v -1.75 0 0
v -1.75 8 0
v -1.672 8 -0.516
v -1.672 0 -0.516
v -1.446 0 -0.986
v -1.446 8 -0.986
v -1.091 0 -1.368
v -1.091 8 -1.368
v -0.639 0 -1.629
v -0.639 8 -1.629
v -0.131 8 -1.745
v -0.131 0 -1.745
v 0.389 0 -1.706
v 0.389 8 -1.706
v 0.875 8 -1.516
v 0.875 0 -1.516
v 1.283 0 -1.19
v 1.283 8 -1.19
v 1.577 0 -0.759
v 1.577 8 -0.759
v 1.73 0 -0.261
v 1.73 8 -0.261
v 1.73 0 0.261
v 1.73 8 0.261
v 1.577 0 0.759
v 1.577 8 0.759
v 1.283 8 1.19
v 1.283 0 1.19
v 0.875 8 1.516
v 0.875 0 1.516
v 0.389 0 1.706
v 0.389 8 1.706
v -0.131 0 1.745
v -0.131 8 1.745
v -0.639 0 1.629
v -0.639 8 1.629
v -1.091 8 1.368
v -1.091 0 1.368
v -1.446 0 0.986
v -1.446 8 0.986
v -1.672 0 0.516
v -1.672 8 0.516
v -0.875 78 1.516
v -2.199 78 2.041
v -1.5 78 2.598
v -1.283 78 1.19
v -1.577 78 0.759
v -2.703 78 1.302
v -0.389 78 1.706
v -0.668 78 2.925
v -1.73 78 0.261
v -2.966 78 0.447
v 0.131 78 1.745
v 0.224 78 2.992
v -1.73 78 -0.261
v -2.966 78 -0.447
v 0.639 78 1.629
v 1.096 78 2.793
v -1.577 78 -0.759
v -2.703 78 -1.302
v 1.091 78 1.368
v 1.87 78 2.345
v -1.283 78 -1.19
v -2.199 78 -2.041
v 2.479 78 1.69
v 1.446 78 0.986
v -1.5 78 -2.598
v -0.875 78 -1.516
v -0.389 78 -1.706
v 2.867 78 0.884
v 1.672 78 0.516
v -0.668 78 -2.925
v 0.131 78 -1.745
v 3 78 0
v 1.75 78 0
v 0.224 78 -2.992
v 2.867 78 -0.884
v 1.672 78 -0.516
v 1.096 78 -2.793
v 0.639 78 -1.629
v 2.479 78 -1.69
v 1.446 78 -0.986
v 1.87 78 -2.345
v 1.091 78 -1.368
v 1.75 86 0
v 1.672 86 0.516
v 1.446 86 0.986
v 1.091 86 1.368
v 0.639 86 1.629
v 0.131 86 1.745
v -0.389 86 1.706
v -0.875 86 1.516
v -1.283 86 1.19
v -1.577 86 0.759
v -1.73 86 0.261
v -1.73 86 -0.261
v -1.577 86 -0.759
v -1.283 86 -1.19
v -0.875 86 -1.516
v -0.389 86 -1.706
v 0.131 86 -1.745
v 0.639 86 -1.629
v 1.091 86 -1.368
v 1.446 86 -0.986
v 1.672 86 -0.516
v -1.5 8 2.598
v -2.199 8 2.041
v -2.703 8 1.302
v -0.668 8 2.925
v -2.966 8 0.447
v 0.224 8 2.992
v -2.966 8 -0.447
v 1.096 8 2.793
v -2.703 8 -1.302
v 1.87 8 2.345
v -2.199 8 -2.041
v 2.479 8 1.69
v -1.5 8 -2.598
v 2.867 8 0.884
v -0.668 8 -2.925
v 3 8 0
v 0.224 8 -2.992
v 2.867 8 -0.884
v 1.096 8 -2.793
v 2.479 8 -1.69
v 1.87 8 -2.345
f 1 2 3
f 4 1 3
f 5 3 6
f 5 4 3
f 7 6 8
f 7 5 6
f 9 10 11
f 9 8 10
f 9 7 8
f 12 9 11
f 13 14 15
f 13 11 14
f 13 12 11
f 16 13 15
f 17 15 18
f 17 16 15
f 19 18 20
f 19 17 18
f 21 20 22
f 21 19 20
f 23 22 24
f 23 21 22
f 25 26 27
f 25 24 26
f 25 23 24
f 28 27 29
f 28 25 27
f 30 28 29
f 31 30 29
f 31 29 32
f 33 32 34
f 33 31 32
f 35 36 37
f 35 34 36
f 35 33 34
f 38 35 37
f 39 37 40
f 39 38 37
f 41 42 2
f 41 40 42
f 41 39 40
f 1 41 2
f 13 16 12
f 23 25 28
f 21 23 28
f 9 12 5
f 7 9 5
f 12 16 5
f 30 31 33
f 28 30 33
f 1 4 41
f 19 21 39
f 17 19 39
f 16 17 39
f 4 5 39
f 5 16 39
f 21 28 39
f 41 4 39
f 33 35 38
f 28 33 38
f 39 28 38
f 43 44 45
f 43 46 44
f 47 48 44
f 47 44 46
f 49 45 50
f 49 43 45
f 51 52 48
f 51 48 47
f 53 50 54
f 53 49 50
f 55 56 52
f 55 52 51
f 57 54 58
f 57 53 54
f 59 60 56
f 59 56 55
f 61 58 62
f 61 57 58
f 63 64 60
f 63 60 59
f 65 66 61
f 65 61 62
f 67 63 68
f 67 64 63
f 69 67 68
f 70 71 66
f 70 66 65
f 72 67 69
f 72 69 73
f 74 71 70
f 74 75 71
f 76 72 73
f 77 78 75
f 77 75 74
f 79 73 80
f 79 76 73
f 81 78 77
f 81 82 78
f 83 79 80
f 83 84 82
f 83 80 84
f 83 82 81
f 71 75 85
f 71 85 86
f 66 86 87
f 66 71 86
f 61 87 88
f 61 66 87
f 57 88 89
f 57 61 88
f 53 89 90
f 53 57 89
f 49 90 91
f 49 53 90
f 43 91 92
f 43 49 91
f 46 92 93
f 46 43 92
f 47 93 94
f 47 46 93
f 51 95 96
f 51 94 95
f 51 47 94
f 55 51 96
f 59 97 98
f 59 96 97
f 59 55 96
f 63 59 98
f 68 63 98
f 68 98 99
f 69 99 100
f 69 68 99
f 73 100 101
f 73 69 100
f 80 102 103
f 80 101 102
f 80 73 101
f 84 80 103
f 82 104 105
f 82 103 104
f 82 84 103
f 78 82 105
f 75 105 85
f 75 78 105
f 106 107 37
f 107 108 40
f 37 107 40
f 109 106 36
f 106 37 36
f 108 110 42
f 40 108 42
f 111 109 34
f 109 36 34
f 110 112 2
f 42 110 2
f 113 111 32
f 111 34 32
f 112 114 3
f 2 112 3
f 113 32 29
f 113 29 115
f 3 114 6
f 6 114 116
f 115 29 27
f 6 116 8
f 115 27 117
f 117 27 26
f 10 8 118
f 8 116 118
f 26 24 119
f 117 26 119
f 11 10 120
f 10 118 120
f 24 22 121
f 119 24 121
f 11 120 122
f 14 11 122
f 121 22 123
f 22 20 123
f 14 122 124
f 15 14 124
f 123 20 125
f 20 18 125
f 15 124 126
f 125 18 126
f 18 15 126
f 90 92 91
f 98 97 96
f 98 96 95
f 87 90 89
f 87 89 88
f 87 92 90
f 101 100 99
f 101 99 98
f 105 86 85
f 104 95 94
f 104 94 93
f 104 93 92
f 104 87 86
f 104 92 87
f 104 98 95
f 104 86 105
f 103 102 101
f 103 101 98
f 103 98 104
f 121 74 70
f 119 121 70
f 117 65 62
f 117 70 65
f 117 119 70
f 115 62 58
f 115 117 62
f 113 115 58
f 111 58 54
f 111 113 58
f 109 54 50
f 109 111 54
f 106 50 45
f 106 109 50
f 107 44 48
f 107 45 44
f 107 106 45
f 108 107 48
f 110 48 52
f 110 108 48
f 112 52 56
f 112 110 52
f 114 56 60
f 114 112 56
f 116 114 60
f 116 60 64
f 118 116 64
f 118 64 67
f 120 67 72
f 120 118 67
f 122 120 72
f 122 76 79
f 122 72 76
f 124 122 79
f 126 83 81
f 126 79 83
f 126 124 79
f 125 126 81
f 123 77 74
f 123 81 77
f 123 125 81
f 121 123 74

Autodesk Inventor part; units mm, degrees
ref_plane "XZ Plane" through (0, 0, 0) normal (0, 1, 0) x (-1, 0, 0)
sketch "Szkic1" plane through (0, 0, 0) normal (0, 1, 0) x (-1, 0, 0)
  circle A0 centre (0, 0) radius 1.75
  dimension "d0" = 3.5
extrude "Wyciągnięcie proste1" add sketch "Szkic1" along normal blind 8
sketch "Szkic2" plane through (0, 8, 0) normal (0, 1, 0) x (1, 0, 0)
  circle A0 centre (0, 0) radius 3
  dimension "d3" = 6
extrude "Wyciągnięcie proste2" add sketch "Szkic2" along normal blind 70
sketch "Szkic3" plane through (0, 78, 0) normal (0, 1, 0) x (1, 0, 0)
  circle A0 centre (0, 0) radius 1.75 projected
  circle A1 centre (0, 0) radius 1.75
  dimension "d6" = 3.5
extrude "Wyciągnięcie proste3" add sketch "Szkic3" along normal blind 8
properties part number "rod_longer"
